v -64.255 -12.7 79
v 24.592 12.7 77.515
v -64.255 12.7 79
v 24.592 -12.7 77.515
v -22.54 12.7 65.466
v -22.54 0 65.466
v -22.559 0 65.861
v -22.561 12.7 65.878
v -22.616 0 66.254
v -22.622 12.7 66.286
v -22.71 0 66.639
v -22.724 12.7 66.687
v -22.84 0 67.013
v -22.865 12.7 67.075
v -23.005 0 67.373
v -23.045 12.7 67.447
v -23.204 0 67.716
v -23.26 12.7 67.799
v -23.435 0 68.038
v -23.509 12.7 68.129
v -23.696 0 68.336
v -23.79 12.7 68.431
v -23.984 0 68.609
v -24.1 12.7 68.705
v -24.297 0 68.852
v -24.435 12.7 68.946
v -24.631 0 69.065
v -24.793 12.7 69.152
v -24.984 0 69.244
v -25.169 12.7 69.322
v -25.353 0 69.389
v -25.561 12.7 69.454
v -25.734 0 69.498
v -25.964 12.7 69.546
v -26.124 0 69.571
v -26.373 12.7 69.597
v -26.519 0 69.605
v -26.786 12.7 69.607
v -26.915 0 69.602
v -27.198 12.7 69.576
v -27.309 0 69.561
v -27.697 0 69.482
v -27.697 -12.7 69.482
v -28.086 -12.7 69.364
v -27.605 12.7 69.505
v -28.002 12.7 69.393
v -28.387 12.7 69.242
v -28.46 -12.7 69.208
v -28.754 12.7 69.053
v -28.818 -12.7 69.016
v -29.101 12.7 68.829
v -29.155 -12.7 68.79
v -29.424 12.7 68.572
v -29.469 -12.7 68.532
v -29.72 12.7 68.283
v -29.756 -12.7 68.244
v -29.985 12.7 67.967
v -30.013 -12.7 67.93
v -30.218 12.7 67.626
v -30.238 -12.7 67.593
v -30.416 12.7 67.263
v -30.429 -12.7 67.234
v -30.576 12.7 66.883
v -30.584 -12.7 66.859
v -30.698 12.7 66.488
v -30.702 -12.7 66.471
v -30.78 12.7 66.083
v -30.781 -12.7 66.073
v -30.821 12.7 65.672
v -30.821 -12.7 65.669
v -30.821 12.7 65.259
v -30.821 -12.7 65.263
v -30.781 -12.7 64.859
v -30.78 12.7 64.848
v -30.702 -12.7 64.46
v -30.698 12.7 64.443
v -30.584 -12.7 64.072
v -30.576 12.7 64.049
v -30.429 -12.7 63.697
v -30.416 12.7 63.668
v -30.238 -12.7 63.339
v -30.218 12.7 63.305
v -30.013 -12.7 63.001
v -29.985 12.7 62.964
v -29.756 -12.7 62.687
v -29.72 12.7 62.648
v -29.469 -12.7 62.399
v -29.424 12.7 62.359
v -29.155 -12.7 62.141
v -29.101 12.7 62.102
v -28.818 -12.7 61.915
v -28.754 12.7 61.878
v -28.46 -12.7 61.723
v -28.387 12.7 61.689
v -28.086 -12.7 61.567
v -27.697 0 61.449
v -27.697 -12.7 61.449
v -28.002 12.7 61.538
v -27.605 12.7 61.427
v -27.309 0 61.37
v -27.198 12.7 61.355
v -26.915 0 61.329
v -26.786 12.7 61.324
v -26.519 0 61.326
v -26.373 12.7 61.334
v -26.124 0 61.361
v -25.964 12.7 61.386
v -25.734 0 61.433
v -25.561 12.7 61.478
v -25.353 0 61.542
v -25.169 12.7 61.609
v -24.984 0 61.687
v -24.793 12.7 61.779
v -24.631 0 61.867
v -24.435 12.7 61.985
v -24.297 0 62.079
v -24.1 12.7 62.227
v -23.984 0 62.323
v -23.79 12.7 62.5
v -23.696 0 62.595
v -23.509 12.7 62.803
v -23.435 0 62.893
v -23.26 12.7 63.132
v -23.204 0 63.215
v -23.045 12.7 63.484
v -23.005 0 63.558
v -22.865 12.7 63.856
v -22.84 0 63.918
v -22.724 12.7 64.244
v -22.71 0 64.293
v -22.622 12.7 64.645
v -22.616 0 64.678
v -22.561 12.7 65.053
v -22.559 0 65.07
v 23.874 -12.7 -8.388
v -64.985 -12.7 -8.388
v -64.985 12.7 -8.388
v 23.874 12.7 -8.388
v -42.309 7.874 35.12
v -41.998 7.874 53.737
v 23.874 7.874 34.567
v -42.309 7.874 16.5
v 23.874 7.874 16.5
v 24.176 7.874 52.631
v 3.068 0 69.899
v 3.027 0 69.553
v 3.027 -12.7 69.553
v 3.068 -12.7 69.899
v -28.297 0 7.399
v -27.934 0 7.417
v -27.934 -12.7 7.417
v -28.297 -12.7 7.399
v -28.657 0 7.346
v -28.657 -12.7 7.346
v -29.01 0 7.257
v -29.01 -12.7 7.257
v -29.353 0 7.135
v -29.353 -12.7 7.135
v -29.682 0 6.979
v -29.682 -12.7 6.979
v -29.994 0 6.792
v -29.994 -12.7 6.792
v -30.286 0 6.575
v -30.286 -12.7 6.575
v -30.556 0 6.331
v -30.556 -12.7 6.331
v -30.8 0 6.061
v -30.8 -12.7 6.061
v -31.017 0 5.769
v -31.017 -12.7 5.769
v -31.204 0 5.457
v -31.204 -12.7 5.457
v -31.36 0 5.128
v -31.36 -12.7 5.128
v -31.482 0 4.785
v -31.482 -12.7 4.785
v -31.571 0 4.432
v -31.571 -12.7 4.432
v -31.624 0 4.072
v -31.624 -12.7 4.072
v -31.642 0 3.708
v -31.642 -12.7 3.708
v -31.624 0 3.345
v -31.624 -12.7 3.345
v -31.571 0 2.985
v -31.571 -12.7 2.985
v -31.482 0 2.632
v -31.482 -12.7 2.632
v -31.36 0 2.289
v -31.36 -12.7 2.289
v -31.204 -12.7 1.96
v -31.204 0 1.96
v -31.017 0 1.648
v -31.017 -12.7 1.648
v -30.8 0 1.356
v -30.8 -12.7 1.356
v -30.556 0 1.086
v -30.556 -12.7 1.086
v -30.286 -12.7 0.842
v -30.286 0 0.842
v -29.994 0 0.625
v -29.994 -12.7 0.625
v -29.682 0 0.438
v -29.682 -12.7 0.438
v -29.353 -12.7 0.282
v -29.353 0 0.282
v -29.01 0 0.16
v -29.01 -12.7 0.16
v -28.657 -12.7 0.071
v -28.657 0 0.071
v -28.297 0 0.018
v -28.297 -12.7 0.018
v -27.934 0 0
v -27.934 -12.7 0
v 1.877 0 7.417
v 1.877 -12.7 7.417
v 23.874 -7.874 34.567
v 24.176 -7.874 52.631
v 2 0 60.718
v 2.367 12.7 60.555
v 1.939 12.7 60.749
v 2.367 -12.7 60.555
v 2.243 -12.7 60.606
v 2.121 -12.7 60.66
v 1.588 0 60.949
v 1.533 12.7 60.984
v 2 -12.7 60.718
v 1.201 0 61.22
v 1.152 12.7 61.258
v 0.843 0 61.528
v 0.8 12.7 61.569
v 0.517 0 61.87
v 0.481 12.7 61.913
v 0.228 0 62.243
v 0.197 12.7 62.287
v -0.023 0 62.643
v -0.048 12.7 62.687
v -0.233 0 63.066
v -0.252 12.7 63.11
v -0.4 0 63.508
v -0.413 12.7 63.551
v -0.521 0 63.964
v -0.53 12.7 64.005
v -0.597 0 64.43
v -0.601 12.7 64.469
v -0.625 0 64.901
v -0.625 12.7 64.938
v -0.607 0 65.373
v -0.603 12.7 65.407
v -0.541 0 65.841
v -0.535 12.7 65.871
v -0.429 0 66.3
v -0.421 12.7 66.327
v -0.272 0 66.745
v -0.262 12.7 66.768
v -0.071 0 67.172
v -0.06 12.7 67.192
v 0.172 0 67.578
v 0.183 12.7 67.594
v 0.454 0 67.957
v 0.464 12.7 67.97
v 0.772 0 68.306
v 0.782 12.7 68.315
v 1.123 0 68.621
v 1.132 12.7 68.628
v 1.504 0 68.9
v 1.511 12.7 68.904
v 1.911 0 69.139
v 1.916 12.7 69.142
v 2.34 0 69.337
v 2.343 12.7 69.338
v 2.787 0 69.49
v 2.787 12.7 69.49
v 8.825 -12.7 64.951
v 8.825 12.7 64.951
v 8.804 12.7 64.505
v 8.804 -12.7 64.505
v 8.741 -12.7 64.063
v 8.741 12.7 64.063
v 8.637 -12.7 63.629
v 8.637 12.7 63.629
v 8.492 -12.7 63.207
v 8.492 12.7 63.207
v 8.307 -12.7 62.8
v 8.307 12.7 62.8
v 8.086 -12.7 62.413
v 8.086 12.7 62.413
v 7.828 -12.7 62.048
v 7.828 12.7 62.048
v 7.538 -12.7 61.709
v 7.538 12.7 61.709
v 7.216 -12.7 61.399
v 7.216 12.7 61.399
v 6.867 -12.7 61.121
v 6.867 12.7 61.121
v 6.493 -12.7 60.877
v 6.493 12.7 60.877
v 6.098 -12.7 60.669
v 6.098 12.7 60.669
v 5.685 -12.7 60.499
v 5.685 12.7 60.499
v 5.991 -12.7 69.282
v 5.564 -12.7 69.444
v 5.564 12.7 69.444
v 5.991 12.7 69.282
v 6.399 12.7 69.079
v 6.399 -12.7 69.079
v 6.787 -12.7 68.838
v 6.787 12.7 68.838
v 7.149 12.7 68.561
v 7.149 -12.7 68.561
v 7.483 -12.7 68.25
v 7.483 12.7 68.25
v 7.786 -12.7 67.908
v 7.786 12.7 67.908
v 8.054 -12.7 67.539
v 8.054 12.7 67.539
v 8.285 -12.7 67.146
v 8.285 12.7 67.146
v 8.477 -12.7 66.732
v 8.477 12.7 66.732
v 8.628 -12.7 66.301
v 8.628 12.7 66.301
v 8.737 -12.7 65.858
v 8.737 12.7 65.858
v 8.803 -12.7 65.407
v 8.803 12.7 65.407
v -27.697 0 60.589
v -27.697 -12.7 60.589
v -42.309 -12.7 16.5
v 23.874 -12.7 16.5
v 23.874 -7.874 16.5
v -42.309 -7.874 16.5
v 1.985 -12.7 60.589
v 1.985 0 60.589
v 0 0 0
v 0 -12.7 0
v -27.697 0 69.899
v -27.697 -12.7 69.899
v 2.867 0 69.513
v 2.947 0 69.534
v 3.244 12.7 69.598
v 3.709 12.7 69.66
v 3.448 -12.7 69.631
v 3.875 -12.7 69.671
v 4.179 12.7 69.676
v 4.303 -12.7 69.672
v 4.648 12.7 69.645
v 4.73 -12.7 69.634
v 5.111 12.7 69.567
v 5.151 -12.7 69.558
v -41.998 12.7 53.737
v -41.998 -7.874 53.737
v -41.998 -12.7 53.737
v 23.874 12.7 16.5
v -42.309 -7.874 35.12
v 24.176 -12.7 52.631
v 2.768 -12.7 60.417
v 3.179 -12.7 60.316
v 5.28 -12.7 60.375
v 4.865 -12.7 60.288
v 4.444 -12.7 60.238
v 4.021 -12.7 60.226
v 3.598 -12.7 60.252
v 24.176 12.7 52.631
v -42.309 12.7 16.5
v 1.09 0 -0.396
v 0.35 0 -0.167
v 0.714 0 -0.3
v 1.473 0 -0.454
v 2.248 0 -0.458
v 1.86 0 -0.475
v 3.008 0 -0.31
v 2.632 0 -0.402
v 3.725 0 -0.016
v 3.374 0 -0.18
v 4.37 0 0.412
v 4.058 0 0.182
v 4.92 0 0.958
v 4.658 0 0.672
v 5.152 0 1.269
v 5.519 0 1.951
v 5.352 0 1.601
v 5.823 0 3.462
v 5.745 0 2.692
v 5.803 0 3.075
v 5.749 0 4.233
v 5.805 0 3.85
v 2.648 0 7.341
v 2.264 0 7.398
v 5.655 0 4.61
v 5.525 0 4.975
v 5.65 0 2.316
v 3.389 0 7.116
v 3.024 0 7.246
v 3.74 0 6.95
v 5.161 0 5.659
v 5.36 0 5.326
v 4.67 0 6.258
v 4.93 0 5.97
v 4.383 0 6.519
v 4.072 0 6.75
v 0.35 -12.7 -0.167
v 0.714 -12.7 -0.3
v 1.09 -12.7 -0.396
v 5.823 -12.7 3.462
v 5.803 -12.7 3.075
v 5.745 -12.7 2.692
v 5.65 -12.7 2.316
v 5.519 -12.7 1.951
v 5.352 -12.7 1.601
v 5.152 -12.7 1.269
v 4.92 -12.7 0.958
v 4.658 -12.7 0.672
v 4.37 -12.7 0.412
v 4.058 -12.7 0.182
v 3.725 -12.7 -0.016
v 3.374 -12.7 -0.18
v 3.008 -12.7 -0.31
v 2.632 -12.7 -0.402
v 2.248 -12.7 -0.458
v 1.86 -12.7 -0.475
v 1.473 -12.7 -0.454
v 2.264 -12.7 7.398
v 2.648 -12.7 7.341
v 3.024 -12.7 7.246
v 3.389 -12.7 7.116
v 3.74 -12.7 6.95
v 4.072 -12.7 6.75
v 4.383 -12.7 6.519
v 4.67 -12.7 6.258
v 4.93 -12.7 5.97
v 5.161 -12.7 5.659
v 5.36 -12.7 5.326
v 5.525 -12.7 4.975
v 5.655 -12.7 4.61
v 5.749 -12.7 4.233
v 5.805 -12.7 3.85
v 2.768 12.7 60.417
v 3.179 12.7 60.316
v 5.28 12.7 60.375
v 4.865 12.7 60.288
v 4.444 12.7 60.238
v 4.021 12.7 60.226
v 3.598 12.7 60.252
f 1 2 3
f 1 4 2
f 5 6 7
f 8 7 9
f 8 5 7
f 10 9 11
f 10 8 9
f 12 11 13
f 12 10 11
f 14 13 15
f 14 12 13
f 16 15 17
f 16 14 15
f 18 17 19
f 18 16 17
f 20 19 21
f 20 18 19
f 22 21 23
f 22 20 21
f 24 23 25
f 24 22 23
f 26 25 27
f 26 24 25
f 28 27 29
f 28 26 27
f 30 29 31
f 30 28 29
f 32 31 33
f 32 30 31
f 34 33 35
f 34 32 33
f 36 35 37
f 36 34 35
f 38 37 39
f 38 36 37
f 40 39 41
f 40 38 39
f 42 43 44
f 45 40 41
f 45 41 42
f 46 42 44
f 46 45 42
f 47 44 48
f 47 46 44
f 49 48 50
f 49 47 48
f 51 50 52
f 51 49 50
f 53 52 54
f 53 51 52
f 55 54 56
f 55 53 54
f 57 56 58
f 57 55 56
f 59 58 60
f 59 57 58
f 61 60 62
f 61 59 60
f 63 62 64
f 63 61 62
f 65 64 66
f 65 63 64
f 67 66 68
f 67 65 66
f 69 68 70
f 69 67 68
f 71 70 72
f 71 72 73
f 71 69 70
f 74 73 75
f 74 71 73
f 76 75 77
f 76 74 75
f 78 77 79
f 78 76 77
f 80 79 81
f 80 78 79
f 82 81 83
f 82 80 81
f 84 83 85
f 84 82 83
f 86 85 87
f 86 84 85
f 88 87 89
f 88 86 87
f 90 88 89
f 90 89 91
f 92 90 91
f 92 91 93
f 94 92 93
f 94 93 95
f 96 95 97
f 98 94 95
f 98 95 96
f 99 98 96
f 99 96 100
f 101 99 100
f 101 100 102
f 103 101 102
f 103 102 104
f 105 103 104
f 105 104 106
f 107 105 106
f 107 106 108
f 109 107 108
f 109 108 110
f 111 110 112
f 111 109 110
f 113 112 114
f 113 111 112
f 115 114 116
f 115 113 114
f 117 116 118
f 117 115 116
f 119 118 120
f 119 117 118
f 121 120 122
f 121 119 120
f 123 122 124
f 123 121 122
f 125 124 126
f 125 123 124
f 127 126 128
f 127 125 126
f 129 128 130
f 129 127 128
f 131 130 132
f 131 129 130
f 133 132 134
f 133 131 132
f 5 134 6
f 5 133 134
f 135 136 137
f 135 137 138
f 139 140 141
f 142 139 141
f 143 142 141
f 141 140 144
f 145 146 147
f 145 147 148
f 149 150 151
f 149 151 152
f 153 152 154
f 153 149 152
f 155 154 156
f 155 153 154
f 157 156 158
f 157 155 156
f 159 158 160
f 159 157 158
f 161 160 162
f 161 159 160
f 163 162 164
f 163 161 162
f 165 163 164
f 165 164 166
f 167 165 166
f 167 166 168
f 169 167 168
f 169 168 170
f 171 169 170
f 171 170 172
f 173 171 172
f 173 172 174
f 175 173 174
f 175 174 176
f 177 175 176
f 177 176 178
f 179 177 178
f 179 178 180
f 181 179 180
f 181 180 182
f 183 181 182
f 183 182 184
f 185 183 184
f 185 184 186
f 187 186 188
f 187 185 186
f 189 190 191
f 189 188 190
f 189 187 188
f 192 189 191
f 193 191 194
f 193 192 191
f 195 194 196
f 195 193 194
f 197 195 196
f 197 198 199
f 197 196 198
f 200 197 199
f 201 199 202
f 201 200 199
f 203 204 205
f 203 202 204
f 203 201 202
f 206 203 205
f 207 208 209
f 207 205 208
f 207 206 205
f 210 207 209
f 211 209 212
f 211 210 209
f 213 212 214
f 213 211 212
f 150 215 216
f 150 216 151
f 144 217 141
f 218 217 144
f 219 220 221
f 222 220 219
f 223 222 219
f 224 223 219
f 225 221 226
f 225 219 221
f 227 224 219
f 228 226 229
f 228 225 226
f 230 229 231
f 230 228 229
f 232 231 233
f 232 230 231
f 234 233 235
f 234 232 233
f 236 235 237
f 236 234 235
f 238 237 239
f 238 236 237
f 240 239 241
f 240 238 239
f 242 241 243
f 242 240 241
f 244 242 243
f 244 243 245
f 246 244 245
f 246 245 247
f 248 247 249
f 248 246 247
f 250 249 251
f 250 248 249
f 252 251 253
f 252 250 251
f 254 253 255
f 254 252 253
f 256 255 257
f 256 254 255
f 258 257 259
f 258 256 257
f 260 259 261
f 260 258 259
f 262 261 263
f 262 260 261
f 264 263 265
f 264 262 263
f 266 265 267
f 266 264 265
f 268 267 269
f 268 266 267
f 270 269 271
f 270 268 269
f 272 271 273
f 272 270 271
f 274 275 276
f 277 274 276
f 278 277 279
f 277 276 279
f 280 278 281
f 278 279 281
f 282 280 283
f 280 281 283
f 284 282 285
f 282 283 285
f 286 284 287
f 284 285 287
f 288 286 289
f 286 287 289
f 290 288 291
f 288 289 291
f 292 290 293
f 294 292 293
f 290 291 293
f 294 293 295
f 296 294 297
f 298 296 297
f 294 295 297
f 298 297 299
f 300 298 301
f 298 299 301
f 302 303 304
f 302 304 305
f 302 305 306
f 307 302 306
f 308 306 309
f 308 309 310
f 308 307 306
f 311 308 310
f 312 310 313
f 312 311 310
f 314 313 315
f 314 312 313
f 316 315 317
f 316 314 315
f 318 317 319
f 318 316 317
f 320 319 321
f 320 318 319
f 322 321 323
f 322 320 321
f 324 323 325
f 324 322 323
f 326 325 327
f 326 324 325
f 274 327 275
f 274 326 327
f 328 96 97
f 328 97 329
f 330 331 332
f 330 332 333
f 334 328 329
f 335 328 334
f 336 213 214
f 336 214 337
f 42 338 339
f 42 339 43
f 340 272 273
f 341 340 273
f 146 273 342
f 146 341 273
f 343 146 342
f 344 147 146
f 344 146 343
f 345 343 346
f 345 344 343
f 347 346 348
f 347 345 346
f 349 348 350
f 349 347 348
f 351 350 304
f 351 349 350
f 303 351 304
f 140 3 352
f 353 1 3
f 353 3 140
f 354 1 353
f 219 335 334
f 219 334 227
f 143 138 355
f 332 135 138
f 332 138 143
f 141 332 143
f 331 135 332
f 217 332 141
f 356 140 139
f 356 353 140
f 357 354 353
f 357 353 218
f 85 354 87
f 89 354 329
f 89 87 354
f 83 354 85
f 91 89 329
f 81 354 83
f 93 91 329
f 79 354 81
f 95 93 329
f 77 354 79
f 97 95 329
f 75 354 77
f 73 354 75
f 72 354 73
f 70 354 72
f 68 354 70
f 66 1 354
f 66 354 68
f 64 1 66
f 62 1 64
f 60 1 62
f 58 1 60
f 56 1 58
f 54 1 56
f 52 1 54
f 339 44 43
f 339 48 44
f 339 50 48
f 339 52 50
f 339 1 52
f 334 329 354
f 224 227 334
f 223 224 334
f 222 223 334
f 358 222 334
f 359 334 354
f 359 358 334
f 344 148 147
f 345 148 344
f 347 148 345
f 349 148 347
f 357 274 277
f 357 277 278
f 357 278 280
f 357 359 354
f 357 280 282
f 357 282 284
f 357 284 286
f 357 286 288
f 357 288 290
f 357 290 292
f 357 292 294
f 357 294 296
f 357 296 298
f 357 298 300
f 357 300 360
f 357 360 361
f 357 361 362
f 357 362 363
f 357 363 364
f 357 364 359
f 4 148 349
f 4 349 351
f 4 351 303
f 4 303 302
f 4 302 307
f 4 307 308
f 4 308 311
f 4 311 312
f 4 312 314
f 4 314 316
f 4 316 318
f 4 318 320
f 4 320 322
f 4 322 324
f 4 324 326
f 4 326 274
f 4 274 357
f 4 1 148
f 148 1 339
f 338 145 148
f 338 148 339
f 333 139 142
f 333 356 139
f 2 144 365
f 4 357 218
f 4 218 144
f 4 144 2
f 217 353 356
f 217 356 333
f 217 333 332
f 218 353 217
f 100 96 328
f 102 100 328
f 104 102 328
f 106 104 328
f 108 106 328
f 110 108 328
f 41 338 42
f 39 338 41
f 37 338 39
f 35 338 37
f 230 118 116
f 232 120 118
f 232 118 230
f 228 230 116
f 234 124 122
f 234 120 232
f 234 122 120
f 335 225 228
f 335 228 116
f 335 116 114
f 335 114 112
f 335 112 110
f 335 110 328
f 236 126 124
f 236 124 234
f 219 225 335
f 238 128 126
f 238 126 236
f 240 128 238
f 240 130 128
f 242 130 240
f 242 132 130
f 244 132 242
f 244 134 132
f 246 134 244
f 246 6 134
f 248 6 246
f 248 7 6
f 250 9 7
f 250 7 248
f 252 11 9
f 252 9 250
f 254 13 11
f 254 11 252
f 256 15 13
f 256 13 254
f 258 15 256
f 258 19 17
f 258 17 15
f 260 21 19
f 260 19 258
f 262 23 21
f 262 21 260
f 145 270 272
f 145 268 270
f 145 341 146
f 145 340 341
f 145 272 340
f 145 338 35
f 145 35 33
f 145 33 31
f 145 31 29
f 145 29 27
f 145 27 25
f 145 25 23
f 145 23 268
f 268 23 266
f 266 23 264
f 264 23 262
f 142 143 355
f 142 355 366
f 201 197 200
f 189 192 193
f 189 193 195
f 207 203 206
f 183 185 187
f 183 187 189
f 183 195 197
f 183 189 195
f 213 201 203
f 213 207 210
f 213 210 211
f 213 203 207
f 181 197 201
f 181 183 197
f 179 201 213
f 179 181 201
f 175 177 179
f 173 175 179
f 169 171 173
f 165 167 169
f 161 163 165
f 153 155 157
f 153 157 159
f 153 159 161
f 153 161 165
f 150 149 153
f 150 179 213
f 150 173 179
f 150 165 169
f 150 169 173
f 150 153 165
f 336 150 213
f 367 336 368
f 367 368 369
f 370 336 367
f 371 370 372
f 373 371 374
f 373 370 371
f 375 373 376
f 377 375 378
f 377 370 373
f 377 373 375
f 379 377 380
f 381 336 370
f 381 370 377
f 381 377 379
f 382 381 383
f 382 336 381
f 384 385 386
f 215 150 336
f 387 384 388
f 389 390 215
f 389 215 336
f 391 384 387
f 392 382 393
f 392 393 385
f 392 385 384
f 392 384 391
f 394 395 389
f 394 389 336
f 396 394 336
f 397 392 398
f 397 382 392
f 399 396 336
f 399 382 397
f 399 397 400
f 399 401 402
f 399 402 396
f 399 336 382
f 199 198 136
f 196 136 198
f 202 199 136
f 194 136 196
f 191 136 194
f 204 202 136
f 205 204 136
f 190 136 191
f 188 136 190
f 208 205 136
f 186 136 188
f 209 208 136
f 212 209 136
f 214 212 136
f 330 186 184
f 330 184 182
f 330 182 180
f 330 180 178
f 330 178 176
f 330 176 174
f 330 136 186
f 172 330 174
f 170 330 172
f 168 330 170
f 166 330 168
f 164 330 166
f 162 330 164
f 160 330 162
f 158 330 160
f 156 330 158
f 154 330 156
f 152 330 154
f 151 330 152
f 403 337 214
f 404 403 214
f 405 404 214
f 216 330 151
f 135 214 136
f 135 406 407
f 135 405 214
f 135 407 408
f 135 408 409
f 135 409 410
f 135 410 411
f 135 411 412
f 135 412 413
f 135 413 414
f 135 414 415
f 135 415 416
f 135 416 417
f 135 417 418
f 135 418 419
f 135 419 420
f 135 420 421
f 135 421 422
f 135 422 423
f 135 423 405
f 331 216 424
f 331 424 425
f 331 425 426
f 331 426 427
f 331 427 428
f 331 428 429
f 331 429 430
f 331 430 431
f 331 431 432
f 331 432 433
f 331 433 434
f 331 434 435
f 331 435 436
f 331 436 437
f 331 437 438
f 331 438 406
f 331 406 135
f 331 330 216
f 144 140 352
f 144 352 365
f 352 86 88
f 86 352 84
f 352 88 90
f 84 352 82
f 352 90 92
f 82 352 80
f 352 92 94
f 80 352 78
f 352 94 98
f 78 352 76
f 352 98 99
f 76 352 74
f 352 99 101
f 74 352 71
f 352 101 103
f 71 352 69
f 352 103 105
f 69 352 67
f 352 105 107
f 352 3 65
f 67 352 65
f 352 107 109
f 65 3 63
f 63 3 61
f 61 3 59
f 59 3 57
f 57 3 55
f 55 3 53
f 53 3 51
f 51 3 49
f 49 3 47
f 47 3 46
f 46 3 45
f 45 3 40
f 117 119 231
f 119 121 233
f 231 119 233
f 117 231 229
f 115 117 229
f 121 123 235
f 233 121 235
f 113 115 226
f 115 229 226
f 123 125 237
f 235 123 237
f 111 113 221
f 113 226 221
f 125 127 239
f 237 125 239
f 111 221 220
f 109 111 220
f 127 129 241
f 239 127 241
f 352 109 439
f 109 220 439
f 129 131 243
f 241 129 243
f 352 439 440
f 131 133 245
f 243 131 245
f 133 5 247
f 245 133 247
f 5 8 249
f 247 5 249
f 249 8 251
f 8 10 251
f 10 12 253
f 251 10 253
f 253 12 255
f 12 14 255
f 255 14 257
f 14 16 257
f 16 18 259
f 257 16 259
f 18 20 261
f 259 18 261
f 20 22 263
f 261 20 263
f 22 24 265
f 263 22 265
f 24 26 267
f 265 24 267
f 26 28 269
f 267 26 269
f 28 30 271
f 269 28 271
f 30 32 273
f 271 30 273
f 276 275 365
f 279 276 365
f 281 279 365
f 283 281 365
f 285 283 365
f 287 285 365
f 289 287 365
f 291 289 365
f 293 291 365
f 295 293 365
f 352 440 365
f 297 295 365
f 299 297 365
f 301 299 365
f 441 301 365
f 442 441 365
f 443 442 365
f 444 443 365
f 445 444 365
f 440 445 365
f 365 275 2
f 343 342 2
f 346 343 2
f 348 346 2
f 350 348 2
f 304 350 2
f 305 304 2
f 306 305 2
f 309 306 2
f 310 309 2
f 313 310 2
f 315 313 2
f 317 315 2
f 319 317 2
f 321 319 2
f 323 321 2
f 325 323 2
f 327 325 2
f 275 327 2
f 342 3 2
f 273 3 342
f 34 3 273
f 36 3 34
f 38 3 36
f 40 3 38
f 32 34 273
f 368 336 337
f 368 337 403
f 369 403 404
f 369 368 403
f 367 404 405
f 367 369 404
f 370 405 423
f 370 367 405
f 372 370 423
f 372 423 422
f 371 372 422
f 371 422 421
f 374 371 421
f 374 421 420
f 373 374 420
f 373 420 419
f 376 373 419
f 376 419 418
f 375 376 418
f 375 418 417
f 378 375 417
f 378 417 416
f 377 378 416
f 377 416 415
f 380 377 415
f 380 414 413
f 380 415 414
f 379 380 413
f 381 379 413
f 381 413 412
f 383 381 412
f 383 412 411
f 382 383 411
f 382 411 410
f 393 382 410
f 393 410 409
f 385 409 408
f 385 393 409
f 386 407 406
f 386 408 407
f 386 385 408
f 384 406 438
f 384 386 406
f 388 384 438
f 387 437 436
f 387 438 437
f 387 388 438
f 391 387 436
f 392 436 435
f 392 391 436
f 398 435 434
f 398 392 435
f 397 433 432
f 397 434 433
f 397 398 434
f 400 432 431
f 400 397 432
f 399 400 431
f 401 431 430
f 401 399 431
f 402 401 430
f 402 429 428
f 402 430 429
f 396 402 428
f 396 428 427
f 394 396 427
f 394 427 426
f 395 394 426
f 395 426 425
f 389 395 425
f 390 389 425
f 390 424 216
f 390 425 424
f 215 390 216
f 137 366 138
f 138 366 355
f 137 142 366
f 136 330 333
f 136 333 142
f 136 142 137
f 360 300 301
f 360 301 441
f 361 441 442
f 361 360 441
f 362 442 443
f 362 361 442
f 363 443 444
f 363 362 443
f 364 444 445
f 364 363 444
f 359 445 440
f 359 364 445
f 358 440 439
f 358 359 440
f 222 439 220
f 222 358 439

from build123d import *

# Parameters (mm, degrees)
F0_R     = 4.142858
F1_DEPTH = 12.7
F3_DEPTH = 36.068
F4_DEPTH = 7.874
F5_DEPTH = 7.874
F6_DEPTH = 12.7
F8_DEPTH = 38.354


with BuildPart() as f1:
    # F0 (on Front) → F1 (new body, symmetric)
    with BuildSketch(Plane.XZ):
        Polygon((23.873951, 16.499758), (-42.309441, 16.499758), (-64.985082, -8.388145), (23.873951, -8.388145), align=None)
        with Locations((-27.192343, 4.516693)):
            Circle(F0_R, mode=Mode.SUBTRACT)
        with BuildLine():
            ThreePointArc((1.935726, 8.94121), (3.594917, 9.242078), (5.254109, 8.94121))
            ThreePointArc((5.254109, 8.94121), (7.478832, 7.208249), (8.320303, 4.516693))
            ThreePointArc((8.320303, 4.516693), (7.395697, 1.708964), (4.983711, 0))
            ThreePointArc((4.983711, 0), (3.594917, -0.208692), (2.206124, 0))
            ThreePointArc((2.206124, 0), (-1.128308, 4.373854), (1.935726, 8.94121))
        make_face(mode=Mode.SUBTRACT)
        with BuildLine():
            ThreePointArc((8.320303, 4.516693), (7.478832, 7.208249), (5.254109, 8.94121))
            Line((5.254109, 8.94121), (1.935726, 8.94121))
            ThreePointArc((1.935726, 8.94121), (-1.128308, 4.373854), (2.206124, 0))
            Line((2.206124, 0), (4.983711, 0))
            ThreePointArc((4.983711, 0), (7.395697, 1.708964), (8.320303, 4.516693))
        make_face()
        with Locations((-27.192343, 4.516693)):
            Circle(F0_R)
        with BuildLine():
            Line((4.983711, 0), (2.206124, 0))
            ThreePointArc((2.206124, 0), (3.594917, -0.208692), (4.983711, 0))
        make_face()
        with BuildLine():
            Line((1.935726, 8.94121), (5.254109, 8.94121))
            ThreePointArc((5.254109, 8.94121), (3.594917, 9.242078), (1.935726, 8.94121))
        make_face()
    extrude(amount=F1_DEPTH, both=True)

    # F2 (on Front) → F3 (cut)
    with BuildSketch(Plane.XZ):
        with BuildLine():
            Line((1.877148, 7.4168), (-27.933743, 7.4168))
            ThreePointArc((-27.933743, 7.4168), (-31.642143, 3.7084), (-27.933743, 0))
            Line((-27.933743, 0), (0, 0))
            ThreePointArc((0, 0), (5.702478, 2.502684), (1.877148, 7.4168))
        make_face()
    extrude(amount=F3_DEPTH, mode=Mode.SUBTRACT)

    # F0 (on Front) → F4 (join, symmetric)
    with BuildSketch(Plane.XZ):
        Polygon((-42.309441, 35.119597), (-42.309441, 16.499758), (23.873951, 16.499758), (23.873951, 34.566533), align=None)
    extrude(amount=F4_DEPTH, both=True)

    # F0 (on Front) → F5 (join, symmetric)
    with BuildSketch(Plane.XZ):
        Polygon((-41.998268, 53.736836), (-42.309441, 35.119597), (23.873951, 34.566533), (24.175882, 52.630785), align=None)
    extrude(amount=F5_DEPTH, both=True)

    # F0 (on Front) → F6 (join, symmetric)
    with BuildSketch(Plane.XZ):
        Polygon((-64.254817, 79.000216), (-41.998268, 53.736836), (24.175882, 52.630785), (24.591806, 77.515212), align=None)
        with Locations((-26.683021, 65.465591)):
            Circle(F0_R, mode=Mode.SUBTRACT)
        with BuildLine():
            ThreePointArc((8.825325, 64.951077), (7.961227, 62.22716), (5.684958, 60.49945))
            ThreePointArc((5.684958, 60.49945), (4.02097, 60.226352), (2.367037, 60.554907))
            ThreePointArc((2.367037, 60.554907), (-0.620239, 65.17283), (2.786823, 69.490349))
            ThreePointArc((2.786823, 69.490349), (4.17891, 69.675802), (5.564021, 69.44393))
            ThreePointArc((5.564021, 69.44393), (7.924048, 67.726948), (8.825325, 64.951077))
        make_face(mode=Mode.SUBTRACT)
    extrude(amount=F6_DEPTH, both=True)

    # F7 (on Front) → F8 (cut)
    with BuildSketch(Plane.XZ):
        Polygon((-27.697399, 60.589042), (1.984779, 60.589042), (3.067527, 69.898891), (-27.697399, 69.898891), align=None)
    extrude(amount=F8_DEPTH, mode=Mode.SUBTRACT)


solid = f1.part
